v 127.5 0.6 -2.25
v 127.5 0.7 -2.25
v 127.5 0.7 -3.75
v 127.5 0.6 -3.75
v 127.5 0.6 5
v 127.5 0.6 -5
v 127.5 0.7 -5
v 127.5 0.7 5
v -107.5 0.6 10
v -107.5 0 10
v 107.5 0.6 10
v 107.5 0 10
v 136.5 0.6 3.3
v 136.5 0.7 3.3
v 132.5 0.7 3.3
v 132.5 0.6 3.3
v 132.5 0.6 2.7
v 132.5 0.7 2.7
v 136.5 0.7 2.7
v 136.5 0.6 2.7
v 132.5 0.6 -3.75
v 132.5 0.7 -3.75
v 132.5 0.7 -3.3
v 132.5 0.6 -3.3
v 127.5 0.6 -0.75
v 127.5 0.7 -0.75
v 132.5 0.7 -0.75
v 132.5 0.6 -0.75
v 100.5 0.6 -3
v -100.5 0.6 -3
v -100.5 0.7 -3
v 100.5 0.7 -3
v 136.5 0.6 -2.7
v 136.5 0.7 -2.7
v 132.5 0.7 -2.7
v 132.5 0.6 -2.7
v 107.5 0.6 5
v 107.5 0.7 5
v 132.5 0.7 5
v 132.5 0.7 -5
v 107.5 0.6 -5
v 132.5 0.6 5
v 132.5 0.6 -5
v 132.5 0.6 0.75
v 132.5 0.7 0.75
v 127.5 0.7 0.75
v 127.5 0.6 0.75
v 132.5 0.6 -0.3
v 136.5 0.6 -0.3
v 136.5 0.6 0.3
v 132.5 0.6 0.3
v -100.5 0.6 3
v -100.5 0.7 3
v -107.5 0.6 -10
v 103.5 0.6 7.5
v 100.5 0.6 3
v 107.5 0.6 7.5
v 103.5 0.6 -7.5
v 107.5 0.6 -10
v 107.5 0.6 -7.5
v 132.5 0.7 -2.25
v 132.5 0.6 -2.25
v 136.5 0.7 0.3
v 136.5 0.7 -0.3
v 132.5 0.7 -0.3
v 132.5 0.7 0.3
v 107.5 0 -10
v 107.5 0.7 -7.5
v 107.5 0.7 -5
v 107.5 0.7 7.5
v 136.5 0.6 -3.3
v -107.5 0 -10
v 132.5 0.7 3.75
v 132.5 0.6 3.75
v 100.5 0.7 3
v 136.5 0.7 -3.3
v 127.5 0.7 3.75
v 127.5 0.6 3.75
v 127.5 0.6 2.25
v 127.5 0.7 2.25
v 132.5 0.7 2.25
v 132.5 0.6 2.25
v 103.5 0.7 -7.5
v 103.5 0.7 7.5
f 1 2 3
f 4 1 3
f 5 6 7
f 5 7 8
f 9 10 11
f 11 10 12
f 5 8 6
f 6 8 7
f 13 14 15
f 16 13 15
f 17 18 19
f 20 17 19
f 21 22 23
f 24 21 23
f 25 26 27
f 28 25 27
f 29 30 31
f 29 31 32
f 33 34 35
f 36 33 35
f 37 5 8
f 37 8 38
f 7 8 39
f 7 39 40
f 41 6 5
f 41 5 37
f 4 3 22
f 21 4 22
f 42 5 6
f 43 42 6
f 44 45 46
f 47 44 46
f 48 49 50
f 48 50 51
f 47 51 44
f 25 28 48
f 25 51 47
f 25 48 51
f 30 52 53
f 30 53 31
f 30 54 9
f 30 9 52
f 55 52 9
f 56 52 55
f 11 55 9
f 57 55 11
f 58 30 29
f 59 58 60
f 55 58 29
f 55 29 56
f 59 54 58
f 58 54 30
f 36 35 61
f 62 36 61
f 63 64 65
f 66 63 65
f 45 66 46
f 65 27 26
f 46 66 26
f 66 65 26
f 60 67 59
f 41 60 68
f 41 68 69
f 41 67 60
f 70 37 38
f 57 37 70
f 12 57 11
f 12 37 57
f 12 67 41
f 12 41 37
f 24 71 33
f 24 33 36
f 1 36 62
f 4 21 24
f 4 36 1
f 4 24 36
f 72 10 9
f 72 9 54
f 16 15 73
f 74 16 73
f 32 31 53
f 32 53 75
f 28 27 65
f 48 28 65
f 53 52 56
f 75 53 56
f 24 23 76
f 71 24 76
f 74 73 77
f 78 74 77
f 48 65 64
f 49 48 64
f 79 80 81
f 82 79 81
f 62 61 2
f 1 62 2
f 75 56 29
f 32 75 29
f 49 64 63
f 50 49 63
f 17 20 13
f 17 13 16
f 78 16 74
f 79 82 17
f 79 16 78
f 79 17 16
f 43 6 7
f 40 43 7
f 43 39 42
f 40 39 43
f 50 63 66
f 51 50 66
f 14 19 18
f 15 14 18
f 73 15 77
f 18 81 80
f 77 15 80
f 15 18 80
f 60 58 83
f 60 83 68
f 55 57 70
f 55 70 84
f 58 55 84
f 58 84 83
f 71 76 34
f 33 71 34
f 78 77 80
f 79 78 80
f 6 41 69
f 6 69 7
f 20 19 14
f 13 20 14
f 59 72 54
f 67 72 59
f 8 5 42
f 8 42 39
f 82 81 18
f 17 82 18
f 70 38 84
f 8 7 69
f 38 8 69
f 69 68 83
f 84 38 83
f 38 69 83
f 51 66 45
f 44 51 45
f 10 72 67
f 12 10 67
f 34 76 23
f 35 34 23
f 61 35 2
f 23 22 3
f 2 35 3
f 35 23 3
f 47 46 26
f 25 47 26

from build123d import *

# Parameters (mm, degrees)
MAIN_BODY_W           = 215
MAIN_BODY_H           = 20
BOSS_EXTRUDE1_DEPTH   = 0.6
SKETCH2_W             = 201
SKETCH2_H             = 6
BOSS_EXTRUDE2_DEPTH   = 0.1
BOSS_EXTRUDE3_DEPTH   = 0.1
SKETCH4_W             = 10
SKETCH4_H             = 0.1
BOSS_EXTRUDE4_DEPTH   = 5
BOSS_EXTRUDE5_DEPTH   = 0.1
BOSS_EXTRUDE5_2_DEPTH = 0.1
BOSS_EXTRUDE5_3_DEPTH = 0.1


with BuildPart() as part:
    # main_body → Boss-Extrude1 (new body)
    with BuildSketch(Plane(origin=(0, 0, 0), x_dir=(1, 0, 0), z_dir=(0, 1, 0))):
        Rectangle(MAIN_BODY_W, MAIN_BODY_H)
    extrude(amount=BOSS_EXTRUDE1_DEPTH)

    # Sketch2 → Boss-Extrude2 (add)
    with BuildSketch(Plane(origin=(0, 0.6, 0), x_dir=(1, 0, 0), z_dir=(0, 1, 0))):
        Rectangle(SKETCH2_W, SKETCH2_H)
    extrude(amount=BOSS_EXTRUDE2_DEPTH)

    # Sketch3 → Boss-Extrude3 (add)
    with BuildSketch(Plane(origin=(0, 0.6, 0), x_dir=(1, 0, 0), z_dir=(0, 1, 0))):
        Polygon((107.5, 5), (127.5, 5), (127.5, -5), (107.5, -5), (107.5, -7.5), (103.5, -7.5), (103.5, 7.5), (107.5, 7.5), align=None)
    extrude(amount=BOSS_EXTRUDE3_DEPTH)


with BuildPart() as body_2:
    # Sketch4 → Boss-Extrude4 (new body)
    with BuildSketch(Plane(origin=(127.5, 0, 0), x_dir=(0, 0, -1), z_dir=(1, 0, 0))):
        with Locations((0, 0.65)):
            Rectangle(SKETCH4_W, SKETCH4_H)
    extrude(amount=BOSS_EXTRUDE4_DEPTH)


with BuildPart() as body_3:
    # Sketch5 → Boss-Extrude5 (new body)
    with BuildSketch(Plane(origin=(0, 0.7, 0), x_dir=(1, 0, 0), z_dir=(0, 1, 0))):
        Polygon((127.5, 3.75), (132.5, 3.75), (132.5, 3.3), (136.5, 3.3), (136.5, 2.7), (132.5, 2.7), (132.5, 2.25), (127.5, 2.25), align=None)
    extrude(amount=-BOSS_EXTRUDE5_DEPTH)


with BuildPart() as body_4:
    # Sketch5 → Boss-Extrude5 2 (new body)
    with BuildSketch(Plane(origin=(0, 0.7, 0), x_dir=(1, 0, 0), z_dir=(0, 1, 0))):
        Polygon((127.5, 0.75), (132.5, 0.75), (132.5, 0.3), (136.5, 0.3), (136.5, -0.3), (132.5, -0.3), (132.5, -0.75), (127.5, -0.75), align=None)
    extrude(amount=-BOSS_EXTRUDE5_2_DEPTH)


with BuildPart() as body_5:
    # Sketch5 → Boss-Extrude5 3 (new body)
    with BuildSketch(Plane(origin=(0, 0.7, 0), x_dir=(1, 0, 0), z_dir=(0, 1, 0))):
        Polygon((127.5, -2.25), (132.5, -2.25), (132.5, -2.7), (136.5, -2.7), (136.5, -3.3), (132.5, -3.3), (132.5, -3.75), (127.5, -3.75), align=None)
    extrude(amount=-BOSS_EXTRUDE5_3_DEPTH)


solid = Compound([part.part, body_2.part, body_3.part, body_4.part, body_5.part])
